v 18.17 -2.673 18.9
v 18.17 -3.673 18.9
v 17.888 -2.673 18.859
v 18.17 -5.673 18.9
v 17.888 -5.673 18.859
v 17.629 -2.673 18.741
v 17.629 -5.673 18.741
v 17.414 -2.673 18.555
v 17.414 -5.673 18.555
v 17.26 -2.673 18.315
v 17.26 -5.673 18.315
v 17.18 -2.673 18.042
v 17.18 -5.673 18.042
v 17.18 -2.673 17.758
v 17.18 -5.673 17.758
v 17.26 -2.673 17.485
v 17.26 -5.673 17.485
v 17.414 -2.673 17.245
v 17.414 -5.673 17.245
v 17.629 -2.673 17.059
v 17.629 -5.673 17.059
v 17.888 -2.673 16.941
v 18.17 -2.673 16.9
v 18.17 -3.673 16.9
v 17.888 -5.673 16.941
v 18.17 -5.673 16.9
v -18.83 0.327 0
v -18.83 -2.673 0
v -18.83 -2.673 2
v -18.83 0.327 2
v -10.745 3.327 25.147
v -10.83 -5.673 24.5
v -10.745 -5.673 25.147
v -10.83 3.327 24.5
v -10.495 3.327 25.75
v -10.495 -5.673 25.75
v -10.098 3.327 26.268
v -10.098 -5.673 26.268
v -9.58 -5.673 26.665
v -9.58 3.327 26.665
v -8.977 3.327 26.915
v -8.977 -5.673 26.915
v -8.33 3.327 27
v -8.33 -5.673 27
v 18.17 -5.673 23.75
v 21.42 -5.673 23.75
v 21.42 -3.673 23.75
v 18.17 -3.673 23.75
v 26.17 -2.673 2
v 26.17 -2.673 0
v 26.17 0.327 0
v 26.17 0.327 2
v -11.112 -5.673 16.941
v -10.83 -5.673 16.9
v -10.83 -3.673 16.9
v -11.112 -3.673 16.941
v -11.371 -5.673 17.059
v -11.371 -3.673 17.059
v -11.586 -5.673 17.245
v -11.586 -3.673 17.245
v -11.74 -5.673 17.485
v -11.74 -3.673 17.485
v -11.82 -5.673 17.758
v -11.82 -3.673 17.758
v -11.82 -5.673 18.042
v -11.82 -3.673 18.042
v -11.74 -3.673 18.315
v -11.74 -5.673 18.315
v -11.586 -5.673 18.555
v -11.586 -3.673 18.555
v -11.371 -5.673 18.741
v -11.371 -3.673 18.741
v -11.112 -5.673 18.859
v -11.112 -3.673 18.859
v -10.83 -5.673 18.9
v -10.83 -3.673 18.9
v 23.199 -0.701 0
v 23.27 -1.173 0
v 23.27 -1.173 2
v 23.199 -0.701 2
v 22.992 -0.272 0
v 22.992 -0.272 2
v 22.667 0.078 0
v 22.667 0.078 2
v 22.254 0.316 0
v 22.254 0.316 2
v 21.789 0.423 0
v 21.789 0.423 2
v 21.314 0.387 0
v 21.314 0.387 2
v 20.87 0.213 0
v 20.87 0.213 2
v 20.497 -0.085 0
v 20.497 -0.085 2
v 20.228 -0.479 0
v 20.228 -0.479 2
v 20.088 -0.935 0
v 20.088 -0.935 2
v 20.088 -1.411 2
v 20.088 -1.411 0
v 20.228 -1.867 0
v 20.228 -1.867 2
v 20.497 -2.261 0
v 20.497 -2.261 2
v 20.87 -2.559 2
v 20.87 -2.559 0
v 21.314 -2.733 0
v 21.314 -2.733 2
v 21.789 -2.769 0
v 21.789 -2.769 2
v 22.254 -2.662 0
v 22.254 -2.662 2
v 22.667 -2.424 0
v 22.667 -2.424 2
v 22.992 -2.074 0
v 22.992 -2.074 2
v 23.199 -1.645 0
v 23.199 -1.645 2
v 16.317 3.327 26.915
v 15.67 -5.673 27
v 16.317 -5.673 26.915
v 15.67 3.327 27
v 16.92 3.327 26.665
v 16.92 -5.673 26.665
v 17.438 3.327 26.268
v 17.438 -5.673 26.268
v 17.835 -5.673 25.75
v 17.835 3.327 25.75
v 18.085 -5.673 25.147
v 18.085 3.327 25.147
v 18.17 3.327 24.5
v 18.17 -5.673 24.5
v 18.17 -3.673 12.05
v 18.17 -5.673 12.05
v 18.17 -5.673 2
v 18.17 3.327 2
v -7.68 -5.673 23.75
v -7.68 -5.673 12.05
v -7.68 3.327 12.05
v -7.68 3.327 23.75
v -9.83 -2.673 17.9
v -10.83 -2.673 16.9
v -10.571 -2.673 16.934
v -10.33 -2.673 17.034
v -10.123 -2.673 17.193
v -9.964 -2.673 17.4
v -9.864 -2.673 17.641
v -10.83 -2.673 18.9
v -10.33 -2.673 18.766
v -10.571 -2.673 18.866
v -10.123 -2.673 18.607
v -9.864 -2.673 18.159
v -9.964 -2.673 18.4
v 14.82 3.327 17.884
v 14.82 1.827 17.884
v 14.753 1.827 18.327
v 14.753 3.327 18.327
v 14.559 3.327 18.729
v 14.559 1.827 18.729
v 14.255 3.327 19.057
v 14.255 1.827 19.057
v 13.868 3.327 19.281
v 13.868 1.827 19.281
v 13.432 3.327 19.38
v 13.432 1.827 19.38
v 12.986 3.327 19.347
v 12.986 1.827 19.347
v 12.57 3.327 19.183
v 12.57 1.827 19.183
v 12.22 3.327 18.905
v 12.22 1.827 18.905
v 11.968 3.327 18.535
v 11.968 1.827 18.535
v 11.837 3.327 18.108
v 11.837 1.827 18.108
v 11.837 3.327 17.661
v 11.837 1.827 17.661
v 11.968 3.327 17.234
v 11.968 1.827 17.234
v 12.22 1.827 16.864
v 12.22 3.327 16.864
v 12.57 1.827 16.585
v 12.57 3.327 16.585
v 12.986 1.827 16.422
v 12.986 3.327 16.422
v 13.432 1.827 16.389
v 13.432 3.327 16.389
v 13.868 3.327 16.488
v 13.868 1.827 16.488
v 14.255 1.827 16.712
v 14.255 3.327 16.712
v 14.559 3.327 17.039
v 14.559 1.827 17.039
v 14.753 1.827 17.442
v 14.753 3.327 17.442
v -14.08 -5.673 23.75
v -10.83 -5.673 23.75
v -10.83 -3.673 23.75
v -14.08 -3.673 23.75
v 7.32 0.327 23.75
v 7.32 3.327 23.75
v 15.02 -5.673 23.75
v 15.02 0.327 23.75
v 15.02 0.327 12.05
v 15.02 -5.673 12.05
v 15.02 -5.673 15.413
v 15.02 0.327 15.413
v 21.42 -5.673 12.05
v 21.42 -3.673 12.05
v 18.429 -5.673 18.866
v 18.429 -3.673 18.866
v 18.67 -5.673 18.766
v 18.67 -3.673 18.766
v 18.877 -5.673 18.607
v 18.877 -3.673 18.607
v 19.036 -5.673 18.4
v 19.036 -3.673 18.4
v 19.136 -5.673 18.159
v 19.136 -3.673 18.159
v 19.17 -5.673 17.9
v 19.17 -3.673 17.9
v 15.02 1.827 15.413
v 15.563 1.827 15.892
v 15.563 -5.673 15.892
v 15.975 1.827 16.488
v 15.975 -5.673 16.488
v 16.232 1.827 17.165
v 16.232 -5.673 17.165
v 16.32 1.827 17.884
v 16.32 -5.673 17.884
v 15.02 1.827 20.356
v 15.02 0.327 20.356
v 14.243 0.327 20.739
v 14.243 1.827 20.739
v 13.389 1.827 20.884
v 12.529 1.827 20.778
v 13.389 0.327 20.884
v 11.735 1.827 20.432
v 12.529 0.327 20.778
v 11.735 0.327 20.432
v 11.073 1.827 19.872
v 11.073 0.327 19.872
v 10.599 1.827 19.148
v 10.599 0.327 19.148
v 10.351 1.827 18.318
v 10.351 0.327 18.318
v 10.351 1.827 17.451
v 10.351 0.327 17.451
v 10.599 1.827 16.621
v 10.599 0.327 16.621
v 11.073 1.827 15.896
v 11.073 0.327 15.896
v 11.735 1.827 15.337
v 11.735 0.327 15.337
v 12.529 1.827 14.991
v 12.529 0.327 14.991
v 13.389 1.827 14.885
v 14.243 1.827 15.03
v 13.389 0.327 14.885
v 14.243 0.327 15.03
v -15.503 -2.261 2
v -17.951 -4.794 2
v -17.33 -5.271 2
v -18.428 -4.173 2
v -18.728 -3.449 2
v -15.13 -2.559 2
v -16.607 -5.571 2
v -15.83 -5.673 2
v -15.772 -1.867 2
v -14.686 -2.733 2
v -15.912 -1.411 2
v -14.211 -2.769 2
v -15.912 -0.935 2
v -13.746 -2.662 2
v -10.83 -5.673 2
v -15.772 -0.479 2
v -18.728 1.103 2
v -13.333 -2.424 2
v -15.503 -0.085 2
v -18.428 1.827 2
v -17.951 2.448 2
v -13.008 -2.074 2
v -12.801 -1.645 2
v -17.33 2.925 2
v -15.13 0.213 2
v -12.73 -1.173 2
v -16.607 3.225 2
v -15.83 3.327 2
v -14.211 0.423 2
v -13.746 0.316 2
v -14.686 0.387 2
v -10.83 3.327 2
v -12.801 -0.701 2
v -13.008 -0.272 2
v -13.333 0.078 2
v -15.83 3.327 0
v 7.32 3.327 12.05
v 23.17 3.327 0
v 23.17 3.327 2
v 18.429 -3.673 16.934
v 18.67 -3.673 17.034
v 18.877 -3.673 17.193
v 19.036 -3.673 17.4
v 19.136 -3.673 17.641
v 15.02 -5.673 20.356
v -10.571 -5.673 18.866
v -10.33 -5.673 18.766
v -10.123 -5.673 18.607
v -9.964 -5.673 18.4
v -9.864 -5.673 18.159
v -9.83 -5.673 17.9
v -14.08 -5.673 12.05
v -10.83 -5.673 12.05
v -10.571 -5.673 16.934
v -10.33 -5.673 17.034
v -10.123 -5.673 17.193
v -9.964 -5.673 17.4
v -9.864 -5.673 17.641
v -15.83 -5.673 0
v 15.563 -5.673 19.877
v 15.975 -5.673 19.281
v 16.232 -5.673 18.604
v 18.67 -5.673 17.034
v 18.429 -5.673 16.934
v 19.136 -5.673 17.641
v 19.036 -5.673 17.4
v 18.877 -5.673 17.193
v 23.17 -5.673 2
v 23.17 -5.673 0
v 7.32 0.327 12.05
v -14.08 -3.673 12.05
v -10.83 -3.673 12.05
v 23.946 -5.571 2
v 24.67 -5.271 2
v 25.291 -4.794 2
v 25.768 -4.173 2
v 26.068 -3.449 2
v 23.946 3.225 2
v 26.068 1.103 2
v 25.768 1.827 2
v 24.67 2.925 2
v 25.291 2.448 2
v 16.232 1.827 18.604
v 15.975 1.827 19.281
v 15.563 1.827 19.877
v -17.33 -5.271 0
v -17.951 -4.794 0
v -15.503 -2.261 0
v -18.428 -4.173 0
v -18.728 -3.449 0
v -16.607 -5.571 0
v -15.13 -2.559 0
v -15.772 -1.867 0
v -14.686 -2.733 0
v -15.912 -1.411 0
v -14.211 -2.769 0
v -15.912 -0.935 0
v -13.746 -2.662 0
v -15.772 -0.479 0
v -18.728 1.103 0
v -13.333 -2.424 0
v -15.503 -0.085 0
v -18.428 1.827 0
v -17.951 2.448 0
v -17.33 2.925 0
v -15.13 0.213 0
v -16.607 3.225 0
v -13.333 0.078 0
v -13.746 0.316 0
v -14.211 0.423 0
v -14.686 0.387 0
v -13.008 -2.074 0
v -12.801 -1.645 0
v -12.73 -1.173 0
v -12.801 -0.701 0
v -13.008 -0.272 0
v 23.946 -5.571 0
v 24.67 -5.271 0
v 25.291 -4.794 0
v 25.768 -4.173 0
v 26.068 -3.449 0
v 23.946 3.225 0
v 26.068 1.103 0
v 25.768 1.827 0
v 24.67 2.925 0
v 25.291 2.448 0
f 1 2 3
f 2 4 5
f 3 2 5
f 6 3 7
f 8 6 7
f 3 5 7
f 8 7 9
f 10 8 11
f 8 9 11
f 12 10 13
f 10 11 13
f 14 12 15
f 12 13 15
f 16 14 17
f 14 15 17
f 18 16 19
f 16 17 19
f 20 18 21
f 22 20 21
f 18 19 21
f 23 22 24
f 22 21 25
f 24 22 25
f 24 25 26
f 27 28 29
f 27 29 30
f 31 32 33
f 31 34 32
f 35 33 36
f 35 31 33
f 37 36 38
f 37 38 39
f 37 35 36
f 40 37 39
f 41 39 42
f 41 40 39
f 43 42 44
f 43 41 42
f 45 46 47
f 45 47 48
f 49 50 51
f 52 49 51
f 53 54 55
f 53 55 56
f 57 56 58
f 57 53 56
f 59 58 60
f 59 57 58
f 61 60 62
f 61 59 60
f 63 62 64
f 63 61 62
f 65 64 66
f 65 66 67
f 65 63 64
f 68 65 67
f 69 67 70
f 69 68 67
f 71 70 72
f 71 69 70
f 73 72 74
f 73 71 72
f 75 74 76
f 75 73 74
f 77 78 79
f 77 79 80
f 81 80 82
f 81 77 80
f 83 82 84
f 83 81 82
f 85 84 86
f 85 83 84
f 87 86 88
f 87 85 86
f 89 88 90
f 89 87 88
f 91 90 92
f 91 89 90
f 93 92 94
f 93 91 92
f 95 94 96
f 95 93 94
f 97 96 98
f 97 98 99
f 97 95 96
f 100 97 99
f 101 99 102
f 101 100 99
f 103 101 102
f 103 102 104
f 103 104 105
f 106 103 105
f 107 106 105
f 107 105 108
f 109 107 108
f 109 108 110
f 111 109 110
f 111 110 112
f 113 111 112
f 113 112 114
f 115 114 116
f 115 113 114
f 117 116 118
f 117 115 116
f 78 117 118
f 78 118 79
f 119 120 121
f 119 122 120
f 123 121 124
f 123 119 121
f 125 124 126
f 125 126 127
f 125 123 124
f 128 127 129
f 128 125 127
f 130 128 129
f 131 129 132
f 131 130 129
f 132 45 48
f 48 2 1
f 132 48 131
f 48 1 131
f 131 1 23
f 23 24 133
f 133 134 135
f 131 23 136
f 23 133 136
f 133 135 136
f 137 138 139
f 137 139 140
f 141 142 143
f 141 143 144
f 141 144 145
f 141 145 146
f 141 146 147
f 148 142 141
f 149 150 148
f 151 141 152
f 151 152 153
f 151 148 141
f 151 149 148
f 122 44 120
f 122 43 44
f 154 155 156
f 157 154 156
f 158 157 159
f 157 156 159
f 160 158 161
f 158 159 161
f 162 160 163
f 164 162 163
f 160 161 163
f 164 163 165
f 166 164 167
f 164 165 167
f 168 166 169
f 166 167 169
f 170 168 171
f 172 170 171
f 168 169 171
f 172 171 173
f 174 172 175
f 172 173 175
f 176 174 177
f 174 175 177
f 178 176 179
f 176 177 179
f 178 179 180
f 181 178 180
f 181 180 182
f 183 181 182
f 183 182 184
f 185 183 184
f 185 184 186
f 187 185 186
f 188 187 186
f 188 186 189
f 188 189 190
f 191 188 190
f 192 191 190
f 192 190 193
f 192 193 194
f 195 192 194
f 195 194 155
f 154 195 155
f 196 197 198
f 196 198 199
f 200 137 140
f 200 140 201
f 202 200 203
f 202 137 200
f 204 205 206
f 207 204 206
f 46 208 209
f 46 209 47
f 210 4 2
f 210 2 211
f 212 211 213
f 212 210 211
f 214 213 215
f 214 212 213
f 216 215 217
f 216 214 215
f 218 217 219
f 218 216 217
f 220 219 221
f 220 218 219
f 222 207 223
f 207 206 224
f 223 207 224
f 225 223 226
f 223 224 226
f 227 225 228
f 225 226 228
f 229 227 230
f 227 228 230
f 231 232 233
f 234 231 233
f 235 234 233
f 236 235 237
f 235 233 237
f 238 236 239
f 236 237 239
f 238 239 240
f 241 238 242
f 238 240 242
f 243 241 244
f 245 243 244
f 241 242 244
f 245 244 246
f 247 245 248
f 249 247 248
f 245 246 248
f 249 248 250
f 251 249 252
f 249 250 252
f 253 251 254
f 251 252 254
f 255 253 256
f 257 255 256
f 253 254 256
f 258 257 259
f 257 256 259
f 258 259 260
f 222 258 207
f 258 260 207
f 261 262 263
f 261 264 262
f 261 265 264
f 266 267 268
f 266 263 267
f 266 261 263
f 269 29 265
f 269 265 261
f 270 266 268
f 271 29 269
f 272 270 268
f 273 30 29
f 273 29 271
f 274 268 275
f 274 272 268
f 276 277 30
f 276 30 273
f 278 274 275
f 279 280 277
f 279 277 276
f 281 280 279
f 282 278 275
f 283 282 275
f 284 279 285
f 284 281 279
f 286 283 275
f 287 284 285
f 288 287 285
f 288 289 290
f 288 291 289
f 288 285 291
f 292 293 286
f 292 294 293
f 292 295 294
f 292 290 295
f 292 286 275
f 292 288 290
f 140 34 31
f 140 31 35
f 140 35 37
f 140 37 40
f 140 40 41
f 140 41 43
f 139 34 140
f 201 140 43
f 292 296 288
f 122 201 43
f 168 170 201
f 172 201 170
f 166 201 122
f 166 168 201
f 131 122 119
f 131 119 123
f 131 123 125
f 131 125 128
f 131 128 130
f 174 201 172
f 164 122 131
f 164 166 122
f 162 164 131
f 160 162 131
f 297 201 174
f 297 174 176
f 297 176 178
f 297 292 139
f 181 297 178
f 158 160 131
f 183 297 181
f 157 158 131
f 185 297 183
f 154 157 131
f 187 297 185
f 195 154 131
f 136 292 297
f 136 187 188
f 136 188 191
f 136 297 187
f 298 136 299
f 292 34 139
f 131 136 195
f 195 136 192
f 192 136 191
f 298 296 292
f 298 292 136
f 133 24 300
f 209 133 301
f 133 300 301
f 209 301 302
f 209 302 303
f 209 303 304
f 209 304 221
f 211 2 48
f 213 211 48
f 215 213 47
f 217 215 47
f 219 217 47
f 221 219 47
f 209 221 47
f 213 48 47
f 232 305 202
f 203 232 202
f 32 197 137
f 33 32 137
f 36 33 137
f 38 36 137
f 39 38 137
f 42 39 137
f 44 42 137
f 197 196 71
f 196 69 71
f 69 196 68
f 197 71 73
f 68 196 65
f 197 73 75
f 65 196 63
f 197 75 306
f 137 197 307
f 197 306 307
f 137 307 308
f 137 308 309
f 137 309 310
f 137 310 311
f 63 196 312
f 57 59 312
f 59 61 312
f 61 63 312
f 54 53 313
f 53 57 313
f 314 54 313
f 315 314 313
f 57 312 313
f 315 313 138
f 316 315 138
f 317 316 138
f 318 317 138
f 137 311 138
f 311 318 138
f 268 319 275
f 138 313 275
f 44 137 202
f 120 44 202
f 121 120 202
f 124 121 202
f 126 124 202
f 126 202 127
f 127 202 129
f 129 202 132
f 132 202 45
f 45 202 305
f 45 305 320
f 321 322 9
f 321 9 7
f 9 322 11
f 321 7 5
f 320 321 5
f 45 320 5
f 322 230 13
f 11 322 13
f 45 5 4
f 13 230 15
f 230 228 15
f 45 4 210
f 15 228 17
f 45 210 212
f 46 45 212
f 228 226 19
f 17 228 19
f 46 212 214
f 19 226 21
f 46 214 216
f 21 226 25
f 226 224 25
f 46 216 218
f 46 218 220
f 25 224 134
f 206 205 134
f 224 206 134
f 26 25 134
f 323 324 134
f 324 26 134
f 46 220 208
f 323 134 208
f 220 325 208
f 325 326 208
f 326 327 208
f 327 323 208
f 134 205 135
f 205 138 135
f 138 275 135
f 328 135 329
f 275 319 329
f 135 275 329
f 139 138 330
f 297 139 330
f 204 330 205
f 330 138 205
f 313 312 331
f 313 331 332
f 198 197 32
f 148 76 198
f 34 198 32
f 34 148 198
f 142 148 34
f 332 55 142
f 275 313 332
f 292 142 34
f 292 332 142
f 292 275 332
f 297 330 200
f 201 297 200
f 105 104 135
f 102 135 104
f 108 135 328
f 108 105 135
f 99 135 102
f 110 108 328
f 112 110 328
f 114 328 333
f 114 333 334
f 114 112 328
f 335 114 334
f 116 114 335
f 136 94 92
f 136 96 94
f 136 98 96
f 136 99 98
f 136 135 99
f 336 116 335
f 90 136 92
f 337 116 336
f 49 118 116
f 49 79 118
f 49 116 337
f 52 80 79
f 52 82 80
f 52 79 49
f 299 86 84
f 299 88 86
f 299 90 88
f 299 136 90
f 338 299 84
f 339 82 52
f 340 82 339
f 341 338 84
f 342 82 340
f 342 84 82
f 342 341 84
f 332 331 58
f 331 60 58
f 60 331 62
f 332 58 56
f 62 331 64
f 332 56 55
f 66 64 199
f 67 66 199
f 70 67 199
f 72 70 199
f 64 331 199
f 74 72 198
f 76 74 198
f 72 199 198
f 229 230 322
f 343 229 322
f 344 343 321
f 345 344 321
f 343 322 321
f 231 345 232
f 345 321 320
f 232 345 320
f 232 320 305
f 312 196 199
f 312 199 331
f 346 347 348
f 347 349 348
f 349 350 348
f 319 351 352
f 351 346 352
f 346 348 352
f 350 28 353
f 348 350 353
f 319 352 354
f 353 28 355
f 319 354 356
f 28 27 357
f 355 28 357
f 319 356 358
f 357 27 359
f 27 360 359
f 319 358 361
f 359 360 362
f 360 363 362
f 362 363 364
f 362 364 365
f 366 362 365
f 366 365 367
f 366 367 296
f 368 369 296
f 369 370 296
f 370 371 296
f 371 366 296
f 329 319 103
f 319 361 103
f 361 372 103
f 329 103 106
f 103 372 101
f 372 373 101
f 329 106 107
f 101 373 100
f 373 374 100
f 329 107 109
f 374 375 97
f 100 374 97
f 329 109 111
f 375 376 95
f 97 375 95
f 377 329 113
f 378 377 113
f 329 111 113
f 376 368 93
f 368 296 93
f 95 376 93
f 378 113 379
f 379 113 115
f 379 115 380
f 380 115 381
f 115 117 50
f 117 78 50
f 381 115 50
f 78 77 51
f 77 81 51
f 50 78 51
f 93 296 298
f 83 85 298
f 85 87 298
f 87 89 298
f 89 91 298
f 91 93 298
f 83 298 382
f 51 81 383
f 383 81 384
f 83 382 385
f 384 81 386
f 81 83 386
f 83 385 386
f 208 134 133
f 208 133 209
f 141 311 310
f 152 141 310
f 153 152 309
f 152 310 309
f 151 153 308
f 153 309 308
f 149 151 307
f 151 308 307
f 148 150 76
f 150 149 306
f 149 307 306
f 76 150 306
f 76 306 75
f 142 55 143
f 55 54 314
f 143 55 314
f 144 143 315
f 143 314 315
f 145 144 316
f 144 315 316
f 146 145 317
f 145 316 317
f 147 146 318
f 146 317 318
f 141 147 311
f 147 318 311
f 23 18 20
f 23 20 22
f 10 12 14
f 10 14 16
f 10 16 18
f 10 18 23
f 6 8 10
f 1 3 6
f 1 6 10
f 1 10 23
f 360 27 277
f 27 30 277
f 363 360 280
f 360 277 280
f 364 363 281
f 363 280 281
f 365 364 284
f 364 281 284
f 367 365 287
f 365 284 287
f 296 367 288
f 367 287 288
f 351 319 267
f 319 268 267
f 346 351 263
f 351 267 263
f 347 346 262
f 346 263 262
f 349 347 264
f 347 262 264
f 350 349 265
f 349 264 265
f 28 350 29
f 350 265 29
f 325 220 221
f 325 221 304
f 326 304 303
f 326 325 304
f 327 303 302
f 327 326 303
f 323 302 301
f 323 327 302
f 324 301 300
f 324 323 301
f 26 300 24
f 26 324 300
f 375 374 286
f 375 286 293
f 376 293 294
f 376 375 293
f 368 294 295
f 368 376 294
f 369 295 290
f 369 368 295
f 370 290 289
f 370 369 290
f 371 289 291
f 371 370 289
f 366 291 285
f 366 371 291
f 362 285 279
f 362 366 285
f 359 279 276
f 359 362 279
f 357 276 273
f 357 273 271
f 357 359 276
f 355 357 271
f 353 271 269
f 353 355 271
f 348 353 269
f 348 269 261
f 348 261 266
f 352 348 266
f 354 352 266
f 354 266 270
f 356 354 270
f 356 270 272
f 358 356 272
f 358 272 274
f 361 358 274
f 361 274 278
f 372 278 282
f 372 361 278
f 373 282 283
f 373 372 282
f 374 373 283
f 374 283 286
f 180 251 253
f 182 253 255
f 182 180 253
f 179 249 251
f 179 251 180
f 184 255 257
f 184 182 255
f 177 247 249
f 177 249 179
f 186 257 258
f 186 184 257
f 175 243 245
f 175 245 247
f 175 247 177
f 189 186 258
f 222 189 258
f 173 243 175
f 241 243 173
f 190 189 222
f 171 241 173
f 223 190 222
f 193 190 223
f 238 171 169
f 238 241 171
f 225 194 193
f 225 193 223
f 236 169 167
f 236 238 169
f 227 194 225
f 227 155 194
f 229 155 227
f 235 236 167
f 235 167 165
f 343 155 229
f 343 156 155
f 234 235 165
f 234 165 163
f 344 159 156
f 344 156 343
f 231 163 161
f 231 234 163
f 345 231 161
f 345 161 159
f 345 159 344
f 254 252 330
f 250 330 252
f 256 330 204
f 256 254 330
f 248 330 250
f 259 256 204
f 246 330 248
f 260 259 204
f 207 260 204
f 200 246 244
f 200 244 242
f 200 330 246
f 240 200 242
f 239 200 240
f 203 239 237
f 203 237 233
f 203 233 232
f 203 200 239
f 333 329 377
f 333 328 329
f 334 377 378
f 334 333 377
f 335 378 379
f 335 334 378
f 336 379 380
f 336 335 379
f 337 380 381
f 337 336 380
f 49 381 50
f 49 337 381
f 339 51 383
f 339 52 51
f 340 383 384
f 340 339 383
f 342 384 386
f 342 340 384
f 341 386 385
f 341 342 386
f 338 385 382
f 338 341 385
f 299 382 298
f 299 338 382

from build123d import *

# Parameters (mm, degrees)
F0_W      = 29
F0_H      = 9
F1_DEPTH  = 27
F0_W_2    = 8
F0_R      = 1.6
F2_DEPTH  = 2
F3_W      = 15
F3_H      = 11.7
F3_R      = 1.5
F4_DEPTH  = 10
F5_DEPTH  = 6
F6_DEPTH  = 7.5
F7_R      = 2.5
F8_R      = 3
F10_DEPTH = 2
F11_DEPTH = 3


# Not quite as in the source:
# - a feature names something its author has since deleted; it is built from what else it names


with BuildPart() as f1:
    # F0 (on Top) → F1 (new body)
    with BuildSketch(Plane.XY):
        with Locations((3.6698216572, -1.1730009172)):
            Rectangle(F0_W, F0_H)
    extrude(amount=F1_DEPTH)

    # F0 (on Top) → F2 (join)
    with BuildSketch(Plane.XY):
        with Locations((-14.8301783428, -1.1730009172)):
            Rectangle(F0_W_2, F0_H)
        with Locations((-14.3301783428, -1.1730009172)):
            Circle(F0_R, mode=Mode.SUBTRACT)
        with Locations((22.1698216572, -1.1730009172)):
            Rectangle(F0_W_2, F0_H)
        with Locations((21.6698216572, -1.1730009172)):
            Circle(F0_R, mode=Mode.SUBTRACT)
    extrude(amount=F2_DEPTH)

    # F3 (on face) → F4 (cut)
    with BuildSketch(Plane.XZ.offset(5.6730009172)):
        with Locations((-0.1801783428, 17.9)):
            Rectangle(F3_W, F3_H)
        with Locations((13.3198216572, 17.8843773901)):
            Circle(F3_R)
    extrude(amount=-F4_DEPTH, mode=Mode.SUBTRACT)

    # F3 (on face) → F5 (cut)
    with BuildSketch(Plane.XZ.offset(5.6730009172)):
        with BuildLine():
            Line((15.0198216572, 23.75), (7.3198216572, 23.75))
            Line((7.3198216572, 23.75), (7.3198216572, 12.05))
            Line((7.3198216572, 12.05), (15.0198216572, 12.05))
            Line((15.0198216572, 12.05), (15.0198216572, 15.4125359713))
            ThreePointArc((15.0198216572, 15.4125359713), (10.3198216572, 17.8843773901), (15.0198216572, 20.356218809))
            Line((15.0198216572, 20.356218809), (15.0198216572, 23.75))
        make_face()
    extrude(amount=-F5_DEPTH, mode=Mode.SUBTRACT)

    # F3 (on face) → F6 (cut)
    with BuildSketch(Plane.XZ.offset(5.6730009172)):
        with BuildLine():
            ThreePointArc((16.3198216572, 17.8843773901), (15.9750052667, 19.2808013945), (15.0198216572, 20.356218809))
            Line((15.0198216572, 20.356218809), (15.0198216572, 15.4125359713))
            ThreePointArc((15.0198216572, 15.4125359713), (15.9750052667, 16.4879533858), (16.3198216572, 17.8843773901))
        make_face()
        with BuildLine():
            Line((15.0198216572, 15.4125359713), (15.0198216572, 20.356218809))
            ThreePointArc((15.0198216572, 20.356218809), (10.3198216572, 17.8843773901), (15.0198216572, 15.4125359713))
        make_face()
        with Locations((13.3198216572, 17.8843773901)):
            Circle(F3_R, mode=Mode.SUBTRACT)
    extrude(amount=-F6_DEPTH, mode=Mode.SUBTRACT)

    # F7
    f7_edges = [f1.edges().sort_by_distance(p)[0] for p in [
        (-10.830178, -1.173001, 27),
        (18.169822, -1.173001, 27),
    ]]
    fillet(f7_edges, radius=F7_R)

    # F8
    f8_edges = [f1.edges().sort_by_distance(p)[0] for p in [
        (-18.830178, 3.326999, 1),
        (-18.830178, -5.673001, 1),
        (26.169822, -5.673001, 1),
        (26.169822, 3.326999, 1),
    ]]
    fillet(f8_edges, radius=F8_R)

    # F9 (on face) → F10 (join)
    with BuildSketch(Plane.XZ.offset(5.6730009172)):
        with BuildLine():
            Line((-14.0801783428, 12.05), (-10.8301783428, 12.05))
            Line((-10.8301783428, 12.05), (-10.8301783428, 16.9))
            ThreePointArc((-10.8301783428, 16.9), (-11.8301783428, 17.9), (-10.8301783428, 18.9))
            Line((-10.8301783428, 18.9), (-10.8301783428, 23.75))
            Line((-10.8301783428, 23.75), (-14.0801783428, 23.75))
            Line((-14.0801783428, 23.75), (-14.0801783428, 12.05))
        make_face()
        with BuildLine():
            Line((18.1698216572, 16.9), (18.1698216572, 12.05))
            Line((18.1698216572, 12.05), (21.4198216572, 12.05))
            Line((21.4198216572, 12.05), (21.4198216572, 23.75))
            Line((21.4198216572, 23.75), (18.1698216572, 23.75))
            Line((18.1698216572, 23.75), (18.1698216572, 18.9))
            ThreePointArc((18.1698216572, 18.9), (18.8769284384, 18.6071067812), (19.1698216572, 17.9))
            ThreePointArc((19.1698216572, 17.9), (18.8769284384, 17.1928932188), (18.1698216572, 16.9))
        make_face()
    extrude(amount=-F10_DEPTH)

    # F9 (on face) → F11 (cut)
    with BuildSketch(Plane.XZ.offset(5.6730009172)):
        with BuildLine():
            Line((-10.8301783428, 18.9), (-10.8301783428, 16.9))
            ThreePointArc((-10.8301783428, 16.9), (-10.1230715616, 17.1928932188), (-9.8301783428, 17.9))
            ThreePointArc((-9.8301783428, 17.9), (-10.1230715616, 18.6071067812), (-10.8301783428, 18.9))
        make_face()
        with BuildLine():
            ThreePointArc((18.1698216572, 18.9), (17.1698216572, 17.9), (18.1698216572, 16.9))
            Line((18.1698216572, 16.9), (18.1698216572, 18.9))
        make_face()
    extrude(amount=-F11_DEPTH, mode=Mode.SUBTRACT)


solid = f1.part
